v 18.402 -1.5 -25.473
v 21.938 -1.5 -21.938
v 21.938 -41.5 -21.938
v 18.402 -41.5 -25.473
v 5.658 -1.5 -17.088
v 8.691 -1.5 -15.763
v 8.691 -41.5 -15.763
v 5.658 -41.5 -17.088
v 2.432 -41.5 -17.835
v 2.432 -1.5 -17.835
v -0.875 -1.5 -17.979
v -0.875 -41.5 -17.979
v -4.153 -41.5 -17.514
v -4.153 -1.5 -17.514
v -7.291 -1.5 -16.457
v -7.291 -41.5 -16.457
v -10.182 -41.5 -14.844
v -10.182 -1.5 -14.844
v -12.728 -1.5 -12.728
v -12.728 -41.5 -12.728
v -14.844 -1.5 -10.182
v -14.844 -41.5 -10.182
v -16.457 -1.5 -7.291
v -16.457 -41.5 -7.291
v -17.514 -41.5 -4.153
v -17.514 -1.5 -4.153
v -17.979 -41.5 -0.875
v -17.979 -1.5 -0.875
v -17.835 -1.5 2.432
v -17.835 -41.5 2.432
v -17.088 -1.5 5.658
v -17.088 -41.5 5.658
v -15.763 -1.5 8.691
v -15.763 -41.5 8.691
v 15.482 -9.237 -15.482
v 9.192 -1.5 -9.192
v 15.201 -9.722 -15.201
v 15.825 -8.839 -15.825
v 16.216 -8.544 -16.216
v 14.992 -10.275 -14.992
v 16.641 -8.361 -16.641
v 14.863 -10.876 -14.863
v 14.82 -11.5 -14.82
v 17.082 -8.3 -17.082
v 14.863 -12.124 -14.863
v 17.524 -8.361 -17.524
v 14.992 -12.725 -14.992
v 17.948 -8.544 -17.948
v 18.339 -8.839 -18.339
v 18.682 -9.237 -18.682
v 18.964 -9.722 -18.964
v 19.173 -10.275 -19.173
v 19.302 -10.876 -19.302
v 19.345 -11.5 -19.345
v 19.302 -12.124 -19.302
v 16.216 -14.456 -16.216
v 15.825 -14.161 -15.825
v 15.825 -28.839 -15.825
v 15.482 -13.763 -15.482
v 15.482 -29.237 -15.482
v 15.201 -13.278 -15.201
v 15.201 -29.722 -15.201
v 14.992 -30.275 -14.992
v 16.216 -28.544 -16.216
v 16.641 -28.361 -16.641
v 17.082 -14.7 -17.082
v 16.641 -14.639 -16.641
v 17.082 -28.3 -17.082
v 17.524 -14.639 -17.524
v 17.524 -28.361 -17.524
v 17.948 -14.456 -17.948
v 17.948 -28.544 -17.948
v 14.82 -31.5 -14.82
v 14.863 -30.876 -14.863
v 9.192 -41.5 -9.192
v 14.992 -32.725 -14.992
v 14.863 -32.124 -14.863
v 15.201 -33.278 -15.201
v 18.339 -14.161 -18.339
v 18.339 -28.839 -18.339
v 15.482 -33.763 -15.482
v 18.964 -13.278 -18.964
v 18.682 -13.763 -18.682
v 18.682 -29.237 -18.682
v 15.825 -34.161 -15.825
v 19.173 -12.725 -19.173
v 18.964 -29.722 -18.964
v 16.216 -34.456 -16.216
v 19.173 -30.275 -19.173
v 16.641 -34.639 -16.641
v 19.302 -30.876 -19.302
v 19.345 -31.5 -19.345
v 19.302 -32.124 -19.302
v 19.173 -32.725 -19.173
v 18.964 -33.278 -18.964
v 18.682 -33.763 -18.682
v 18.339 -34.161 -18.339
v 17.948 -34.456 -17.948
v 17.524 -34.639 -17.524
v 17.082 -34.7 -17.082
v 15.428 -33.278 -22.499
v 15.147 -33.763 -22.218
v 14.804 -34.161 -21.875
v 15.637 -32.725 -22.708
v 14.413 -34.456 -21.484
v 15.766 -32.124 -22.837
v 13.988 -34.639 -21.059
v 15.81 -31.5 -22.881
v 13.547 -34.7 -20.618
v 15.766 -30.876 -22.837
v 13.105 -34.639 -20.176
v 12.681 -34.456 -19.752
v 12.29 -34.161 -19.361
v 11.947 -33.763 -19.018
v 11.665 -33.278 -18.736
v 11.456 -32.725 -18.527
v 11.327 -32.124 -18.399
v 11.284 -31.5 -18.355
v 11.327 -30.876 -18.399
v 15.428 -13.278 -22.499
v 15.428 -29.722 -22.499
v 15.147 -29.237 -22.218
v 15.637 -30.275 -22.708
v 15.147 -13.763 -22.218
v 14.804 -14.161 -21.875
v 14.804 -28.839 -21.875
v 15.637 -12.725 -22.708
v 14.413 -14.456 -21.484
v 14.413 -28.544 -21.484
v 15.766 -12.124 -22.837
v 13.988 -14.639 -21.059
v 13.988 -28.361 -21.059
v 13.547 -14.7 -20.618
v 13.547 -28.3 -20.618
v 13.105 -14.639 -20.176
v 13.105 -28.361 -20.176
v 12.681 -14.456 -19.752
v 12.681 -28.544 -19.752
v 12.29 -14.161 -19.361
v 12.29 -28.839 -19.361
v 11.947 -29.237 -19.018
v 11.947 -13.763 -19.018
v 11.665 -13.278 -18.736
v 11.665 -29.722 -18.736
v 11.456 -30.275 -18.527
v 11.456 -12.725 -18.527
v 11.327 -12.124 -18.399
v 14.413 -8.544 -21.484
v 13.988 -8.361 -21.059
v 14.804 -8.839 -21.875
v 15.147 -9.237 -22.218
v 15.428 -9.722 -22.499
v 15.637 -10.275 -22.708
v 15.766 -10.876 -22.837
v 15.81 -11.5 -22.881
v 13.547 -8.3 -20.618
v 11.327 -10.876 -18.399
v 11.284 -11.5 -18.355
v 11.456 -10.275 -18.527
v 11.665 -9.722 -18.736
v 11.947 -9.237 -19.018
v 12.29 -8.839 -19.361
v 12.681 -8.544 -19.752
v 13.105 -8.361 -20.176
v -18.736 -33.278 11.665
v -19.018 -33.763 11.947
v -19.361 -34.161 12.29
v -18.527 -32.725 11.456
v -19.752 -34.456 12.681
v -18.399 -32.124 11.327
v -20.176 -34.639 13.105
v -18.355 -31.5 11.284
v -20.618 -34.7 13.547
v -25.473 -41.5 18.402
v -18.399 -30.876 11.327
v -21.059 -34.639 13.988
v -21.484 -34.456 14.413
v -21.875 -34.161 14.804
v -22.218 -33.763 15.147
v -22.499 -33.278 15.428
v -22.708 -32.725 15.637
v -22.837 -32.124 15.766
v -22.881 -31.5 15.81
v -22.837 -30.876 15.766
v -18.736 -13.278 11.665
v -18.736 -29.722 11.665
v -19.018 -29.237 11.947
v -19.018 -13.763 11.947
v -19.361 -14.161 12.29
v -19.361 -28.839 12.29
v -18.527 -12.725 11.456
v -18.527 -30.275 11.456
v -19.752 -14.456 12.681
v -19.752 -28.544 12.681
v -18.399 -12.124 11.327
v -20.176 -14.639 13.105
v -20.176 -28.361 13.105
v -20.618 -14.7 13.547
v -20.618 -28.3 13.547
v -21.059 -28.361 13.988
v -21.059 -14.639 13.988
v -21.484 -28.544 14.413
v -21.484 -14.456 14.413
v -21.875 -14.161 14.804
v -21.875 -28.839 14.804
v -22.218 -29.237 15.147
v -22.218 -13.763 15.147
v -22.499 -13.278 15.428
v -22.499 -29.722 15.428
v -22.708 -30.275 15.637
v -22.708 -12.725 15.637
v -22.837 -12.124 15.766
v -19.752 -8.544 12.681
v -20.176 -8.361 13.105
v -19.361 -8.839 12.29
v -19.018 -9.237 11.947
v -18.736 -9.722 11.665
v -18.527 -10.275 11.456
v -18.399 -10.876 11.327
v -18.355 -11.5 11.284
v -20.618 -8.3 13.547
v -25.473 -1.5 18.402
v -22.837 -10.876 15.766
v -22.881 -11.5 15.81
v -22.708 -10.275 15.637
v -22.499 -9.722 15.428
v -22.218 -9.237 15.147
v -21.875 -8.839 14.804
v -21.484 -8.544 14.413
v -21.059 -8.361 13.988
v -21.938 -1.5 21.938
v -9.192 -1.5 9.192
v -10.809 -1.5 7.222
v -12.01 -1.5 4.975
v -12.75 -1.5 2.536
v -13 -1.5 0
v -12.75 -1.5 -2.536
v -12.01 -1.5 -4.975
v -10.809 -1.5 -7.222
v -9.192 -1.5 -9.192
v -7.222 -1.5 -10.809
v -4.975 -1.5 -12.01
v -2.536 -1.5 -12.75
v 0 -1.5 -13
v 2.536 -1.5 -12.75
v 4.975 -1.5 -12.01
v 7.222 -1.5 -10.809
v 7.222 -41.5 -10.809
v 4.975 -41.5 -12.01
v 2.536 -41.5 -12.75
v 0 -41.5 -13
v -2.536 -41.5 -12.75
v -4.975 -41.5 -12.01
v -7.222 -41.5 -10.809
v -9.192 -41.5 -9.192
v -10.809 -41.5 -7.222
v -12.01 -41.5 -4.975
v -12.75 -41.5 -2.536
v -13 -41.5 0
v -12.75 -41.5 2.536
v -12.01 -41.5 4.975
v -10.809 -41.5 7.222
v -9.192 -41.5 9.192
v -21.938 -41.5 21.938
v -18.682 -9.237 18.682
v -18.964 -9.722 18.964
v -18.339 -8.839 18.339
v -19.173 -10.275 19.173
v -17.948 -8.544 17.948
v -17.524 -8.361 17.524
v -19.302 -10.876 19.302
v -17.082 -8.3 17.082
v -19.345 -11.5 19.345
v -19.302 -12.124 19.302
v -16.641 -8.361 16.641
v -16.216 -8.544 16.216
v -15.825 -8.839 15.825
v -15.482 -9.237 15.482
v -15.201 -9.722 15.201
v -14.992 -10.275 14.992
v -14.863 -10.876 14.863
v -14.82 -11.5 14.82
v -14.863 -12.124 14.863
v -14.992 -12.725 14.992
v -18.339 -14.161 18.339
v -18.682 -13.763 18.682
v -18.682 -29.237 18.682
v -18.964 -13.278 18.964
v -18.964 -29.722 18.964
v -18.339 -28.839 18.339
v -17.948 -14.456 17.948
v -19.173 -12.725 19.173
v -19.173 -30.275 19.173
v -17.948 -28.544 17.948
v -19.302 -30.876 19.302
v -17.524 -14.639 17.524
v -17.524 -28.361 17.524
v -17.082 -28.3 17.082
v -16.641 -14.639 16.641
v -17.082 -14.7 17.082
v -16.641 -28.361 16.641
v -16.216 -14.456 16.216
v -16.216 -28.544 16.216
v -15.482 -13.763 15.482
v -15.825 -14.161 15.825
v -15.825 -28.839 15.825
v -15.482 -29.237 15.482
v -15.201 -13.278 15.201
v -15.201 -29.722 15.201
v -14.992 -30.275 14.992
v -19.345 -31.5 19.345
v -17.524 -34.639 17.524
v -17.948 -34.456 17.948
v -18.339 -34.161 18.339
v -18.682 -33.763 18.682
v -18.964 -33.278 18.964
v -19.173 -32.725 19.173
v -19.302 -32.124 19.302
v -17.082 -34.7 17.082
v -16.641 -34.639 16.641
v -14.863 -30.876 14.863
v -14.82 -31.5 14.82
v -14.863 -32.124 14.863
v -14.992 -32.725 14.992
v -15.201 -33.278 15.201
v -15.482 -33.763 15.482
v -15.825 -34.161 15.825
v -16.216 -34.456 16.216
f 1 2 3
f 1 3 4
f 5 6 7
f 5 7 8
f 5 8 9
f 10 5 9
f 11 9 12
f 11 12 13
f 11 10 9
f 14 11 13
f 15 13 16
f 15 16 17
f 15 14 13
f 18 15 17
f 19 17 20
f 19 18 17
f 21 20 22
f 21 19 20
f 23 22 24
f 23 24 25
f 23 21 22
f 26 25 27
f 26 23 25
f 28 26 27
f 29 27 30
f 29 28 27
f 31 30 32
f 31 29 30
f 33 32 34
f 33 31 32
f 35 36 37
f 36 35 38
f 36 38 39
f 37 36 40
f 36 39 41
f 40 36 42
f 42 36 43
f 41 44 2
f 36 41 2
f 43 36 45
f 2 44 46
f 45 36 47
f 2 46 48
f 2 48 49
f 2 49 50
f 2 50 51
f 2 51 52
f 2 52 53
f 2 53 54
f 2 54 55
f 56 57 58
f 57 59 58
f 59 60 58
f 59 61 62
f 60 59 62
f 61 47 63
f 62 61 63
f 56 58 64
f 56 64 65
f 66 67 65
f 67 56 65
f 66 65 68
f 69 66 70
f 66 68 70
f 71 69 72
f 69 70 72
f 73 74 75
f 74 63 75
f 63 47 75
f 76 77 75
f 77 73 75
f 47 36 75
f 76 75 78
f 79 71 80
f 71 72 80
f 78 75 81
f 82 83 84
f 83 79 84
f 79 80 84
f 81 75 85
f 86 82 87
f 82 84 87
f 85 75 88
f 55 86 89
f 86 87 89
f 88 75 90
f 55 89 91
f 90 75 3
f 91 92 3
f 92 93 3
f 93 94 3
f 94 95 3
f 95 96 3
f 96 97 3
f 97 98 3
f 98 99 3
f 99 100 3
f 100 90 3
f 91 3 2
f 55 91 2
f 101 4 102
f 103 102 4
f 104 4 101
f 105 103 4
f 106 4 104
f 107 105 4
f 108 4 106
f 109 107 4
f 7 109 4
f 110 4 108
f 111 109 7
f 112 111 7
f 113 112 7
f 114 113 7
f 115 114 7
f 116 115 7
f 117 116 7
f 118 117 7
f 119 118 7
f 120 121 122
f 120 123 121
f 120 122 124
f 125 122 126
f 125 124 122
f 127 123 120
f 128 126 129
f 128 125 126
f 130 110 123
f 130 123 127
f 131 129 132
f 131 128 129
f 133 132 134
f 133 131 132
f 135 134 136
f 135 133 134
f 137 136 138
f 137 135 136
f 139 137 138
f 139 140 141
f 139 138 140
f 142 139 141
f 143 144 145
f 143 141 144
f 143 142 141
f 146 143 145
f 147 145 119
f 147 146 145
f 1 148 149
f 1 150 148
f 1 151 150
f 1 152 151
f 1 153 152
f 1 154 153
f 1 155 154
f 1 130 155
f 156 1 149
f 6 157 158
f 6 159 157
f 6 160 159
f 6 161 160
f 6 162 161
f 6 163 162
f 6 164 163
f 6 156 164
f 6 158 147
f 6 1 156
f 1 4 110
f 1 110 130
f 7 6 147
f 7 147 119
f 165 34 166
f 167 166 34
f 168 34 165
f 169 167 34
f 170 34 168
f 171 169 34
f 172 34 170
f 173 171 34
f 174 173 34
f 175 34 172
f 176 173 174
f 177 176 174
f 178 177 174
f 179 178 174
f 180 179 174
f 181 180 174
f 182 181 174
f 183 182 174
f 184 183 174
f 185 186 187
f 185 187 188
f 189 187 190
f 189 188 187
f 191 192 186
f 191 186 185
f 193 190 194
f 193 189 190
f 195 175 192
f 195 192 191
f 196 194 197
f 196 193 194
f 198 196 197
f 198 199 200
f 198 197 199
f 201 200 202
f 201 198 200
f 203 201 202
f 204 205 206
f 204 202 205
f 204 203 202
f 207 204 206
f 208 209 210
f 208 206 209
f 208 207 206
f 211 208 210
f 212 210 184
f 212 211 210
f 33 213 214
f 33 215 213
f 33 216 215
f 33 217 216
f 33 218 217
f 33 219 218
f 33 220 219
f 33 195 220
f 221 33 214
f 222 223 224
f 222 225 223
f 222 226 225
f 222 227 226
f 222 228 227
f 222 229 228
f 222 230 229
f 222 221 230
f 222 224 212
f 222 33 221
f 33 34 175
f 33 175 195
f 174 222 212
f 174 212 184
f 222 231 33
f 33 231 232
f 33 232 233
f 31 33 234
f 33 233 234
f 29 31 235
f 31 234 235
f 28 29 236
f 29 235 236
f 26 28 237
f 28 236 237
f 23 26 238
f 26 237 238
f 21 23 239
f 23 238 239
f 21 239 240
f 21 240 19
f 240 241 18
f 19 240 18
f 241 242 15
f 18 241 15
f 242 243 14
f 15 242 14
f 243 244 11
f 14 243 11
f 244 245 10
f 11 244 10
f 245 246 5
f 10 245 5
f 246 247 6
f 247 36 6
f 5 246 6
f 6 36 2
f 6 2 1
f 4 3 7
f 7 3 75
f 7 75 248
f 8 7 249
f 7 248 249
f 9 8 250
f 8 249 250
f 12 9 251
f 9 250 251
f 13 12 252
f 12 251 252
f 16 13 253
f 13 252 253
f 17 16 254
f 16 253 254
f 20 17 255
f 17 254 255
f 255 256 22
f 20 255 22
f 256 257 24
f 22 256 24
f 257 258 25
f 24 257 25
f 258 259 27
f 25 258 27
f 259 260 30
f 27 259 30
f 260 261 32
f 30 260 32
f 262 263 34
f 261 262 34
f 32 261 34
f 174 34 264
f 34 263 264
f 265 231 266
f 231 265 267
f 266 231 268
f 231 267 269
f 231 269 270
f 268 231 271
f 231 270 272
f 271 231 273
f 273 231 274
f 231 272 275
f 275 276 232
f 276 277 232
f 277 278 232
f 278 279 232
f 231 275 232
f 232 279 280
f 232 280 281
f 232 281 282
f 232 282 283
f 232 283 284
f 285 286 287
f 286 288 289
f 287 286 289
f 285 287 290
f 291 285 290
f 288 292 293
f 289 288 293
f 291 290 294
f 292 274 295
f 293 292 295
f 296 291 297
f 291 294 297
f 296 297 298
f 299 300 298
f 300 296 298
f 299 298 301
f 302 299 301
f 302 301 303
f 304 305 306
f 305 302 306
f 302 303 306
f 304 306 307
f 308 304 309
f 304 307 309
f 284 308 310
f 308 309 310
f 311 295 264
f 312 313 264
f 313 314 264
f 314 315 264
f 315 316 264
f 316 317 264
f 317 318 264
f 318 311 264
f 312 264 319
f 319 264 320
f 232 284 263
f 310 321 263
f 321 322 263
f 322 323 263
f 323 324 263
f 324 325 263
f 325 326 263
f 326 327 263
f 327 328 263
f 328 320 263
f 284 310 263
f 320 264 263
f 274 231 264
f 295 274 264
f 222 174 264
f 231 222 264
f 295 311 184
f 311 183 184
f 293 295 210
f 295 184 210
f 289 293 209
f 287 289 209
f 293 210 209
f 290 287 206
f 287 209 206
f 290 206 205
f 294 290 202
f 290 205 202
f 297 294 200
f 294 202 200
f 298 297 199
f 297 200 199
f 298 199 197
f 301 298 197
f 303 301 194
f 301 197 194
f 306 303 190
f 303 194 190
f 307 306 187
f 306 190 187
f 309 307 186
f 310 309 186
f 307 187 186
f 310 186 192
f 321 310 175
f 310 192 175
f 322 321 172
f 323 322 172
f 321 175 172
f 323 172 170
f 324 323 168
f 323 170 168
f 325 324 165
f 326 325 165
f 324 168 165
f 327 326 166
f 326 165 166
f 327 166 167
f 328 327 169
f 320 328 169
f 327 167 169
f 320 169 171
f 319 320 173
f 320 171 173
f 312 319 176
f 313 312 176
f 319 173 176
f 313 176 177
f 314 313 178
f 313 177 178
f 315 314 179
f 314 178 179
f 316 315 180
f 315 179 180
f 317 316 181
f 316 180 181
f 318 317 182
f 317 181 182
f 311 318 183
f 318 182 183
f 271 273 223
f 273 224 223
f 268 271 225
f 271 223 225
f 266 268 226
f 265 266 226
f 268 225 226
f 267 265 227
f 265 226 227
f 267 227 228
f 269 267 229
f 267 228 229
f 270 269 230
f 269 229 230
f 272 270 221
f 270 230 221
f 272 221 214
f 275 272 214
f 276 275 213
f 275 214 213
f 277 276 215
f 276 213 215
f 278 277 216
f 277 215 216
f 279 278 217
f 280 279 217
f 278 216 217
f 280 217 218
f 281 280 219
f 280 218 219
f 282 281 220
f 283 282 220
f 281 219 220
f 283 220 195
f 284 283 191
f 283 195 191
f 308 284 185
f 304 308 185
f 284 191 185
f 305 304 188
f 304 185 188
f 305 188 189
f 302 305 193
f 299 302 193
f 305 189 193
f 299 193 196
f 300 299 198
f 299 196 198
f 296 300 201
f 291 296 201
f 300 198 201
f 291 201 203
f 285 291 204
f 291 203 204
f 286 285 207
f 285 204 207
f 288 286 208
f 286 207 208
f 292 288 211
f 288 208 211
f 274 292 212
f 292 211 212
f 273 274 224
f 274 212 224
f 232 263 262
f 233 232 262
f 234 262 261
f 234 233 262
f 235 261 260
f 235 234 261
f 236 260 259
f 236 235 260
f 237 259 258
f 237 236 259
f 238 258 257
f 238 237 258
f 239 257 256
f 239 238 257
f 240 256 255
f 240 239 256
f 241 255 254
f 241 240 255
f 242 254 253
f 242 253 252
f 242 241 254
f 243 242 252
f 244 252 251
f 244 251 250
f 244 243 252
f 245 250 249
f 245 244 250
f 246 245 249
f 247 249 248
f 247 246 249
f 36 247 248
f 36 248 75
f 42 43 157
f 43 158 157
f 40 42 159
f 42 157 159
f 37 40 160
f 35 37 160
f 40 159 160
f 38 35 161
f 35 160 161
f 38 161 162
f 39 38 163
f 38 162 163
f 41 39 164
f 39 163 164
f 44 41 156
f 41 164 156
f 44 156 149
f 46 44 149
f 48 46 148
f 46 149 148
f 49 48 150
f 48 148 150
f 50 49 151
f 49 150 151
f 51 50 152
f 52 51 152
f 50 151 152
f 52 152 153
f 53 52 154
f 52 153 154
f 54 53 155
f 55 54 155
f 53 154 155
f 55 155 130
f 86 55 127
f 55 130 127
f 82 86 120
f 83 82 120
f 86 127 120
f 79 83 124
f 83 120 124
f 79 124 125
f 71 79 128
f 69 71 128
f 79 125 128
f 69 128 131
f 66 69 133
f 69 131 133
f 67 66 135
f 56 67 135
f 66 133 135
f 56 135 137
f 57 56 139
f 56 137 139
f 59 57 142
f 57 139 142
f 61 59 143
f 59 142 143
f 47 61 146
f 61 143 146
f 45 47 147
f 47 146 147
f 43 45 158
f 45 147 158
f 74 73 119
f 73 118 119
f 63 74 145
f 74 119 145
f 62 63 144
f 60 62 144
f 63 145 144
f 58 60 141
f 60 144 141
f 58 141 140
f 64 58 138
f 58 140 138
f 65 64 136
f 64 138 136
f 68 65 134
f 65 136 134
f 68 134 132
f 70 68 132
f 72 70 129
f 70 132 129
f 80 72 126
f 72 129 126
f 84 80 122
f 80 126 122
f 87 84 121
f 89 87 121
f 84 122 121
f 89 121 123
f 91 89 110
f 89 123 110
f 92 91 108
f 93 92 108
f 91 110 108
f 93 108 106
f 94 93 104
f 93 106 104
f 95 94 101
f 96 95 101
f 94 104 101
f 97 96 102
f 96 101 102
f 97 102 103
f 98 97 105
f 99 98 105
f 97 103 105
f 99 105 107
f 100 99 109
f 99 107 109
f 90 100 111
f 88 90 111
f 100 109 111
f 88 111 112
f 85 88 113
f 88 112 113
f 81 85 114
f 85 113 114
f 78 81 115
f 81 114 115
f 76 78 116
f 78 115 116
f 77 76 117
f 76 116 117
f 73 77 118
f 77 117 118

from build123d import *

# Parameters (mm, degrees)
BOSS_EXTRUDE1_DEPTH      = 1.5
M3_CLEARANCE_HOLE1_D     = 3.2
M3_CLEARANCE_HOLE1_DEPTH = 3
SKETCH5_R                = 15
CUT_EXTRUDE1_DEPTH       = 1
CUT_EXTRUDE1_DEPTH_BACK  = 4
SKETCH6_R                = 13
BOSS_EXTRUDE2_DEPTH      = 40
M6_CLEARANCE_HOLE1_D     = 6.4
M6_CLEARANCE_HOLE1_DEPTH = 10
SKETCH11_OUTSIDE_W       = 233.632
SKETCH11_OUTSIDE_H       = 233.632
CUT_EXTRUDE2_DEPTH       = 40
SKETCH12_W               = 183.089507272
SKETCH12_H               = 5.144734847
CUT_EXTRUDE4_DEPTH       = 91
CUT_EXTRUDE4_DEPTH_BACK  = 91


with BuildPart() as part:
    # Sketch1 → Boss-Extrude1 (new body, symmetric)
    with BuildSketch(Plane(origin=(0, 0, 0), x_dir=(1, 0, 0), z_dir=(0, 1, 0))):
        with BuildLine():
            Line((50, 10), (84, 10))
            ThreePointArc((84, 10), (88.242640687, 8.242640687), (90, 4))
            Line((90, 4), (90, -4))
            ThreePointArc((90, -4), (88.242640687, -8.242640687), (84, -10))
            Line((84, -10), (50, -10))
            ThreePointArc((50, -10), (21.715728753, -21.715728753), (10, -50))
            Line((10, -50), (10, -84))
            ThreePointArc((10, -84), (8.242640687, -88.242640687), (4, -90))
            Line((4, -90), (-4, -90))
            ThreePointArc((-4, -90), (-8.242640687, -88.242640687), (-10, -84))
            Line((-10, -84), (-10, -50))
            ThreePointArc((-10, -50), (-21.715728753, -21.715728753), (-50, -10))
            Line((-50, -10), (-84, -10))
            ThreePointArc((-84, -10), (-88.242640687, -8.242640687), (-90, -4))
            Line((-90, -4), (-90, 4))
            ThreePointArc((-90, 4), (-88.242640687, 8.242640687), (-84, 10))
            Line((-84, 10), (-50, 10))
            ThreePointArc((-50, 10), (-21.715728753, 21.715728753), (-10, 50))
            Line((-10, 50), (-10, 84))
            ThreePointArc((-10, 84), (-8.242640687, 88.242640687), (-4, 90))
            Line((-4, 90), (4, 90))
            ThreePointArc((4, 90), (8.242640687, 88.242640687), (10, 84))
            Line((10, 84), (10, 50))
            ThreePointArc((10, 50), (21.715728753, 21.715728753), (50, 10))
        make_face()
    extrude(amount=BOSS_EXTRUDE1_DEPTH, both=True)

    # M3 Clearance Hole1
    with Locations(Plane(origin=(0, 1.5, 0), x_dir=(1, 0, 0), z_dir=(0, 1, 0))):
        with Locations((-84, 4), (-84, -4), (-4, 84), (4, 84), (84, 4), (84, -4), (4, -84), (-4, -84), (-39, 4), (-39, -4), (39, 4), (39, -4), (4, -39), (-4, -39), (-4, 39), (4, 39)):
            Hole(M3_CLEARANCE_HOLE1_D / 2, depth=M3_CLEARANCE_HOLE1_DEPTH)

    # Sketch5 → Cut-Extrude1 (cut, two sides)
    with BuildSketch(Plane(origin=(0, 1.5, 0), x_dir=(1, 0, 0), z_dir=(0, 1, 0))) as cut_extrude1_sk:
        Circle(SKETCH5_R)
    extrude(amount=CUT_EXTRUDE1_DEPTH, mode=Mode.SUBTRACT)
    extrude(cut_extrude1_sk.sketch, amount=-CUT_EXTRUDE1_DEPTH_BACK, mode=Mode.SUBTRACT)

    # Sketch6 → Boss-Extrude2 (add)
    with BuildSketch(Plane.XZ.offset(1.5)):
        with BuildLine():
            Line((-15.762553167, 8.691485355), (-25.473103505, 18.402035693))
            Line((-25.473103505, 18.402035693), (-18.402035693, 25.473103505))
            Line((-18.402035693, 25.473103505), (-8.691485355, 15.762553167))
            ThreePointArc((-8.691485355, 15.762553167), (12.727922061, 12.727922061), (15.762553167, -8.691485355))
            Line((15.762553167, -8.691485355), (25.473103505, -18.402035693))
            Line((25.473103505, -18.402035693), (18.402035693, -25.473103505))
            Line((18.402035693, -25.473103505), (8.691485355, -15.762553167))
            ThreePointArc((8.691485355, -15.762553167), (-12.727922061, -12.727922061), (-15.762553167, 8.691485355))
        make_face()
        Circle(SKETCH6_R, mode=Mode.SUBTRACT)
    extrude(amount=BOSS_EXTRUDE2_DEPTH)

    # M6 Clearance Hole1
    with Locations(Plane(origin=(3.535533906, 0, 3.535533906), x_dir=(0.707106781, 0, -0.707106781), z_dir=(0.707106781, 0, 0.707106781))):
        with Locations((-24.158012459, -11.5), (-24.158012459, -31.5), (24.158012459, -11.5), (24.158012459, -31.5)):
            Hole(M6_CLEARANCE_HOLE1_D / 2, depth=M6_CLEARANCE_HOLE1_DEPTH)

    # Sketch11 outside → Cut-Extrude2 (cut)
    with BuildSketch(Plane.XZ.offset(41.5)):
        Rectangle(SKETCH11_OUTSIDE_W, SKETCH11_OUTSIDE_H)
        with BuildLine():
            Line((-21.937569599, 21.937569599), (21.937569599, -21.937569599))
            Line((21.937569599, -21.937569599), (18.402035693, -25.473103505))
            Line((18.402035693, -25.473103505), (8.691485355, -15.762553167))
            ThreePointArc((8.691485355, -15.762553167), (-12.727922061, -12.727922061), (-15.762553167, 8.691485355))
            Line((-15.762553167, 8.691485355), (-25.473103505, 18.402035693))
            Line((-25.473103505, 18.402035693), (-21.937569599, 21.937569599))
        make_face(mode=Mode.SUBTRACT)
    extrude(amount=-CUT_EXTRUDE2_DEPTH, mode=Mode.SUBTRACT)

    # Sketch12 → Cut-Extrude4 (cut, two sides)
    with BuildSketch(Plane(origin=(0, 0, 0), x_dir=(0, 0, -1), z_dir=(1, 0, 0))) as cut_extrude4_sk:
        with Locations((-1.544753636, 1.072367424)):
            Rectangle(SKETCH12_W, SKETCH12_H)
    extrude(amount=CUT_EXTRUDE4_DEPTH, mode=Mode.SUBTRACT)
    extrude(cut_extrude4_sk.sketch, amount=-CUT_EXTRUDE4_DEPTH_BACK, mode=Mode.SUBTRACT)


solid = part.part
